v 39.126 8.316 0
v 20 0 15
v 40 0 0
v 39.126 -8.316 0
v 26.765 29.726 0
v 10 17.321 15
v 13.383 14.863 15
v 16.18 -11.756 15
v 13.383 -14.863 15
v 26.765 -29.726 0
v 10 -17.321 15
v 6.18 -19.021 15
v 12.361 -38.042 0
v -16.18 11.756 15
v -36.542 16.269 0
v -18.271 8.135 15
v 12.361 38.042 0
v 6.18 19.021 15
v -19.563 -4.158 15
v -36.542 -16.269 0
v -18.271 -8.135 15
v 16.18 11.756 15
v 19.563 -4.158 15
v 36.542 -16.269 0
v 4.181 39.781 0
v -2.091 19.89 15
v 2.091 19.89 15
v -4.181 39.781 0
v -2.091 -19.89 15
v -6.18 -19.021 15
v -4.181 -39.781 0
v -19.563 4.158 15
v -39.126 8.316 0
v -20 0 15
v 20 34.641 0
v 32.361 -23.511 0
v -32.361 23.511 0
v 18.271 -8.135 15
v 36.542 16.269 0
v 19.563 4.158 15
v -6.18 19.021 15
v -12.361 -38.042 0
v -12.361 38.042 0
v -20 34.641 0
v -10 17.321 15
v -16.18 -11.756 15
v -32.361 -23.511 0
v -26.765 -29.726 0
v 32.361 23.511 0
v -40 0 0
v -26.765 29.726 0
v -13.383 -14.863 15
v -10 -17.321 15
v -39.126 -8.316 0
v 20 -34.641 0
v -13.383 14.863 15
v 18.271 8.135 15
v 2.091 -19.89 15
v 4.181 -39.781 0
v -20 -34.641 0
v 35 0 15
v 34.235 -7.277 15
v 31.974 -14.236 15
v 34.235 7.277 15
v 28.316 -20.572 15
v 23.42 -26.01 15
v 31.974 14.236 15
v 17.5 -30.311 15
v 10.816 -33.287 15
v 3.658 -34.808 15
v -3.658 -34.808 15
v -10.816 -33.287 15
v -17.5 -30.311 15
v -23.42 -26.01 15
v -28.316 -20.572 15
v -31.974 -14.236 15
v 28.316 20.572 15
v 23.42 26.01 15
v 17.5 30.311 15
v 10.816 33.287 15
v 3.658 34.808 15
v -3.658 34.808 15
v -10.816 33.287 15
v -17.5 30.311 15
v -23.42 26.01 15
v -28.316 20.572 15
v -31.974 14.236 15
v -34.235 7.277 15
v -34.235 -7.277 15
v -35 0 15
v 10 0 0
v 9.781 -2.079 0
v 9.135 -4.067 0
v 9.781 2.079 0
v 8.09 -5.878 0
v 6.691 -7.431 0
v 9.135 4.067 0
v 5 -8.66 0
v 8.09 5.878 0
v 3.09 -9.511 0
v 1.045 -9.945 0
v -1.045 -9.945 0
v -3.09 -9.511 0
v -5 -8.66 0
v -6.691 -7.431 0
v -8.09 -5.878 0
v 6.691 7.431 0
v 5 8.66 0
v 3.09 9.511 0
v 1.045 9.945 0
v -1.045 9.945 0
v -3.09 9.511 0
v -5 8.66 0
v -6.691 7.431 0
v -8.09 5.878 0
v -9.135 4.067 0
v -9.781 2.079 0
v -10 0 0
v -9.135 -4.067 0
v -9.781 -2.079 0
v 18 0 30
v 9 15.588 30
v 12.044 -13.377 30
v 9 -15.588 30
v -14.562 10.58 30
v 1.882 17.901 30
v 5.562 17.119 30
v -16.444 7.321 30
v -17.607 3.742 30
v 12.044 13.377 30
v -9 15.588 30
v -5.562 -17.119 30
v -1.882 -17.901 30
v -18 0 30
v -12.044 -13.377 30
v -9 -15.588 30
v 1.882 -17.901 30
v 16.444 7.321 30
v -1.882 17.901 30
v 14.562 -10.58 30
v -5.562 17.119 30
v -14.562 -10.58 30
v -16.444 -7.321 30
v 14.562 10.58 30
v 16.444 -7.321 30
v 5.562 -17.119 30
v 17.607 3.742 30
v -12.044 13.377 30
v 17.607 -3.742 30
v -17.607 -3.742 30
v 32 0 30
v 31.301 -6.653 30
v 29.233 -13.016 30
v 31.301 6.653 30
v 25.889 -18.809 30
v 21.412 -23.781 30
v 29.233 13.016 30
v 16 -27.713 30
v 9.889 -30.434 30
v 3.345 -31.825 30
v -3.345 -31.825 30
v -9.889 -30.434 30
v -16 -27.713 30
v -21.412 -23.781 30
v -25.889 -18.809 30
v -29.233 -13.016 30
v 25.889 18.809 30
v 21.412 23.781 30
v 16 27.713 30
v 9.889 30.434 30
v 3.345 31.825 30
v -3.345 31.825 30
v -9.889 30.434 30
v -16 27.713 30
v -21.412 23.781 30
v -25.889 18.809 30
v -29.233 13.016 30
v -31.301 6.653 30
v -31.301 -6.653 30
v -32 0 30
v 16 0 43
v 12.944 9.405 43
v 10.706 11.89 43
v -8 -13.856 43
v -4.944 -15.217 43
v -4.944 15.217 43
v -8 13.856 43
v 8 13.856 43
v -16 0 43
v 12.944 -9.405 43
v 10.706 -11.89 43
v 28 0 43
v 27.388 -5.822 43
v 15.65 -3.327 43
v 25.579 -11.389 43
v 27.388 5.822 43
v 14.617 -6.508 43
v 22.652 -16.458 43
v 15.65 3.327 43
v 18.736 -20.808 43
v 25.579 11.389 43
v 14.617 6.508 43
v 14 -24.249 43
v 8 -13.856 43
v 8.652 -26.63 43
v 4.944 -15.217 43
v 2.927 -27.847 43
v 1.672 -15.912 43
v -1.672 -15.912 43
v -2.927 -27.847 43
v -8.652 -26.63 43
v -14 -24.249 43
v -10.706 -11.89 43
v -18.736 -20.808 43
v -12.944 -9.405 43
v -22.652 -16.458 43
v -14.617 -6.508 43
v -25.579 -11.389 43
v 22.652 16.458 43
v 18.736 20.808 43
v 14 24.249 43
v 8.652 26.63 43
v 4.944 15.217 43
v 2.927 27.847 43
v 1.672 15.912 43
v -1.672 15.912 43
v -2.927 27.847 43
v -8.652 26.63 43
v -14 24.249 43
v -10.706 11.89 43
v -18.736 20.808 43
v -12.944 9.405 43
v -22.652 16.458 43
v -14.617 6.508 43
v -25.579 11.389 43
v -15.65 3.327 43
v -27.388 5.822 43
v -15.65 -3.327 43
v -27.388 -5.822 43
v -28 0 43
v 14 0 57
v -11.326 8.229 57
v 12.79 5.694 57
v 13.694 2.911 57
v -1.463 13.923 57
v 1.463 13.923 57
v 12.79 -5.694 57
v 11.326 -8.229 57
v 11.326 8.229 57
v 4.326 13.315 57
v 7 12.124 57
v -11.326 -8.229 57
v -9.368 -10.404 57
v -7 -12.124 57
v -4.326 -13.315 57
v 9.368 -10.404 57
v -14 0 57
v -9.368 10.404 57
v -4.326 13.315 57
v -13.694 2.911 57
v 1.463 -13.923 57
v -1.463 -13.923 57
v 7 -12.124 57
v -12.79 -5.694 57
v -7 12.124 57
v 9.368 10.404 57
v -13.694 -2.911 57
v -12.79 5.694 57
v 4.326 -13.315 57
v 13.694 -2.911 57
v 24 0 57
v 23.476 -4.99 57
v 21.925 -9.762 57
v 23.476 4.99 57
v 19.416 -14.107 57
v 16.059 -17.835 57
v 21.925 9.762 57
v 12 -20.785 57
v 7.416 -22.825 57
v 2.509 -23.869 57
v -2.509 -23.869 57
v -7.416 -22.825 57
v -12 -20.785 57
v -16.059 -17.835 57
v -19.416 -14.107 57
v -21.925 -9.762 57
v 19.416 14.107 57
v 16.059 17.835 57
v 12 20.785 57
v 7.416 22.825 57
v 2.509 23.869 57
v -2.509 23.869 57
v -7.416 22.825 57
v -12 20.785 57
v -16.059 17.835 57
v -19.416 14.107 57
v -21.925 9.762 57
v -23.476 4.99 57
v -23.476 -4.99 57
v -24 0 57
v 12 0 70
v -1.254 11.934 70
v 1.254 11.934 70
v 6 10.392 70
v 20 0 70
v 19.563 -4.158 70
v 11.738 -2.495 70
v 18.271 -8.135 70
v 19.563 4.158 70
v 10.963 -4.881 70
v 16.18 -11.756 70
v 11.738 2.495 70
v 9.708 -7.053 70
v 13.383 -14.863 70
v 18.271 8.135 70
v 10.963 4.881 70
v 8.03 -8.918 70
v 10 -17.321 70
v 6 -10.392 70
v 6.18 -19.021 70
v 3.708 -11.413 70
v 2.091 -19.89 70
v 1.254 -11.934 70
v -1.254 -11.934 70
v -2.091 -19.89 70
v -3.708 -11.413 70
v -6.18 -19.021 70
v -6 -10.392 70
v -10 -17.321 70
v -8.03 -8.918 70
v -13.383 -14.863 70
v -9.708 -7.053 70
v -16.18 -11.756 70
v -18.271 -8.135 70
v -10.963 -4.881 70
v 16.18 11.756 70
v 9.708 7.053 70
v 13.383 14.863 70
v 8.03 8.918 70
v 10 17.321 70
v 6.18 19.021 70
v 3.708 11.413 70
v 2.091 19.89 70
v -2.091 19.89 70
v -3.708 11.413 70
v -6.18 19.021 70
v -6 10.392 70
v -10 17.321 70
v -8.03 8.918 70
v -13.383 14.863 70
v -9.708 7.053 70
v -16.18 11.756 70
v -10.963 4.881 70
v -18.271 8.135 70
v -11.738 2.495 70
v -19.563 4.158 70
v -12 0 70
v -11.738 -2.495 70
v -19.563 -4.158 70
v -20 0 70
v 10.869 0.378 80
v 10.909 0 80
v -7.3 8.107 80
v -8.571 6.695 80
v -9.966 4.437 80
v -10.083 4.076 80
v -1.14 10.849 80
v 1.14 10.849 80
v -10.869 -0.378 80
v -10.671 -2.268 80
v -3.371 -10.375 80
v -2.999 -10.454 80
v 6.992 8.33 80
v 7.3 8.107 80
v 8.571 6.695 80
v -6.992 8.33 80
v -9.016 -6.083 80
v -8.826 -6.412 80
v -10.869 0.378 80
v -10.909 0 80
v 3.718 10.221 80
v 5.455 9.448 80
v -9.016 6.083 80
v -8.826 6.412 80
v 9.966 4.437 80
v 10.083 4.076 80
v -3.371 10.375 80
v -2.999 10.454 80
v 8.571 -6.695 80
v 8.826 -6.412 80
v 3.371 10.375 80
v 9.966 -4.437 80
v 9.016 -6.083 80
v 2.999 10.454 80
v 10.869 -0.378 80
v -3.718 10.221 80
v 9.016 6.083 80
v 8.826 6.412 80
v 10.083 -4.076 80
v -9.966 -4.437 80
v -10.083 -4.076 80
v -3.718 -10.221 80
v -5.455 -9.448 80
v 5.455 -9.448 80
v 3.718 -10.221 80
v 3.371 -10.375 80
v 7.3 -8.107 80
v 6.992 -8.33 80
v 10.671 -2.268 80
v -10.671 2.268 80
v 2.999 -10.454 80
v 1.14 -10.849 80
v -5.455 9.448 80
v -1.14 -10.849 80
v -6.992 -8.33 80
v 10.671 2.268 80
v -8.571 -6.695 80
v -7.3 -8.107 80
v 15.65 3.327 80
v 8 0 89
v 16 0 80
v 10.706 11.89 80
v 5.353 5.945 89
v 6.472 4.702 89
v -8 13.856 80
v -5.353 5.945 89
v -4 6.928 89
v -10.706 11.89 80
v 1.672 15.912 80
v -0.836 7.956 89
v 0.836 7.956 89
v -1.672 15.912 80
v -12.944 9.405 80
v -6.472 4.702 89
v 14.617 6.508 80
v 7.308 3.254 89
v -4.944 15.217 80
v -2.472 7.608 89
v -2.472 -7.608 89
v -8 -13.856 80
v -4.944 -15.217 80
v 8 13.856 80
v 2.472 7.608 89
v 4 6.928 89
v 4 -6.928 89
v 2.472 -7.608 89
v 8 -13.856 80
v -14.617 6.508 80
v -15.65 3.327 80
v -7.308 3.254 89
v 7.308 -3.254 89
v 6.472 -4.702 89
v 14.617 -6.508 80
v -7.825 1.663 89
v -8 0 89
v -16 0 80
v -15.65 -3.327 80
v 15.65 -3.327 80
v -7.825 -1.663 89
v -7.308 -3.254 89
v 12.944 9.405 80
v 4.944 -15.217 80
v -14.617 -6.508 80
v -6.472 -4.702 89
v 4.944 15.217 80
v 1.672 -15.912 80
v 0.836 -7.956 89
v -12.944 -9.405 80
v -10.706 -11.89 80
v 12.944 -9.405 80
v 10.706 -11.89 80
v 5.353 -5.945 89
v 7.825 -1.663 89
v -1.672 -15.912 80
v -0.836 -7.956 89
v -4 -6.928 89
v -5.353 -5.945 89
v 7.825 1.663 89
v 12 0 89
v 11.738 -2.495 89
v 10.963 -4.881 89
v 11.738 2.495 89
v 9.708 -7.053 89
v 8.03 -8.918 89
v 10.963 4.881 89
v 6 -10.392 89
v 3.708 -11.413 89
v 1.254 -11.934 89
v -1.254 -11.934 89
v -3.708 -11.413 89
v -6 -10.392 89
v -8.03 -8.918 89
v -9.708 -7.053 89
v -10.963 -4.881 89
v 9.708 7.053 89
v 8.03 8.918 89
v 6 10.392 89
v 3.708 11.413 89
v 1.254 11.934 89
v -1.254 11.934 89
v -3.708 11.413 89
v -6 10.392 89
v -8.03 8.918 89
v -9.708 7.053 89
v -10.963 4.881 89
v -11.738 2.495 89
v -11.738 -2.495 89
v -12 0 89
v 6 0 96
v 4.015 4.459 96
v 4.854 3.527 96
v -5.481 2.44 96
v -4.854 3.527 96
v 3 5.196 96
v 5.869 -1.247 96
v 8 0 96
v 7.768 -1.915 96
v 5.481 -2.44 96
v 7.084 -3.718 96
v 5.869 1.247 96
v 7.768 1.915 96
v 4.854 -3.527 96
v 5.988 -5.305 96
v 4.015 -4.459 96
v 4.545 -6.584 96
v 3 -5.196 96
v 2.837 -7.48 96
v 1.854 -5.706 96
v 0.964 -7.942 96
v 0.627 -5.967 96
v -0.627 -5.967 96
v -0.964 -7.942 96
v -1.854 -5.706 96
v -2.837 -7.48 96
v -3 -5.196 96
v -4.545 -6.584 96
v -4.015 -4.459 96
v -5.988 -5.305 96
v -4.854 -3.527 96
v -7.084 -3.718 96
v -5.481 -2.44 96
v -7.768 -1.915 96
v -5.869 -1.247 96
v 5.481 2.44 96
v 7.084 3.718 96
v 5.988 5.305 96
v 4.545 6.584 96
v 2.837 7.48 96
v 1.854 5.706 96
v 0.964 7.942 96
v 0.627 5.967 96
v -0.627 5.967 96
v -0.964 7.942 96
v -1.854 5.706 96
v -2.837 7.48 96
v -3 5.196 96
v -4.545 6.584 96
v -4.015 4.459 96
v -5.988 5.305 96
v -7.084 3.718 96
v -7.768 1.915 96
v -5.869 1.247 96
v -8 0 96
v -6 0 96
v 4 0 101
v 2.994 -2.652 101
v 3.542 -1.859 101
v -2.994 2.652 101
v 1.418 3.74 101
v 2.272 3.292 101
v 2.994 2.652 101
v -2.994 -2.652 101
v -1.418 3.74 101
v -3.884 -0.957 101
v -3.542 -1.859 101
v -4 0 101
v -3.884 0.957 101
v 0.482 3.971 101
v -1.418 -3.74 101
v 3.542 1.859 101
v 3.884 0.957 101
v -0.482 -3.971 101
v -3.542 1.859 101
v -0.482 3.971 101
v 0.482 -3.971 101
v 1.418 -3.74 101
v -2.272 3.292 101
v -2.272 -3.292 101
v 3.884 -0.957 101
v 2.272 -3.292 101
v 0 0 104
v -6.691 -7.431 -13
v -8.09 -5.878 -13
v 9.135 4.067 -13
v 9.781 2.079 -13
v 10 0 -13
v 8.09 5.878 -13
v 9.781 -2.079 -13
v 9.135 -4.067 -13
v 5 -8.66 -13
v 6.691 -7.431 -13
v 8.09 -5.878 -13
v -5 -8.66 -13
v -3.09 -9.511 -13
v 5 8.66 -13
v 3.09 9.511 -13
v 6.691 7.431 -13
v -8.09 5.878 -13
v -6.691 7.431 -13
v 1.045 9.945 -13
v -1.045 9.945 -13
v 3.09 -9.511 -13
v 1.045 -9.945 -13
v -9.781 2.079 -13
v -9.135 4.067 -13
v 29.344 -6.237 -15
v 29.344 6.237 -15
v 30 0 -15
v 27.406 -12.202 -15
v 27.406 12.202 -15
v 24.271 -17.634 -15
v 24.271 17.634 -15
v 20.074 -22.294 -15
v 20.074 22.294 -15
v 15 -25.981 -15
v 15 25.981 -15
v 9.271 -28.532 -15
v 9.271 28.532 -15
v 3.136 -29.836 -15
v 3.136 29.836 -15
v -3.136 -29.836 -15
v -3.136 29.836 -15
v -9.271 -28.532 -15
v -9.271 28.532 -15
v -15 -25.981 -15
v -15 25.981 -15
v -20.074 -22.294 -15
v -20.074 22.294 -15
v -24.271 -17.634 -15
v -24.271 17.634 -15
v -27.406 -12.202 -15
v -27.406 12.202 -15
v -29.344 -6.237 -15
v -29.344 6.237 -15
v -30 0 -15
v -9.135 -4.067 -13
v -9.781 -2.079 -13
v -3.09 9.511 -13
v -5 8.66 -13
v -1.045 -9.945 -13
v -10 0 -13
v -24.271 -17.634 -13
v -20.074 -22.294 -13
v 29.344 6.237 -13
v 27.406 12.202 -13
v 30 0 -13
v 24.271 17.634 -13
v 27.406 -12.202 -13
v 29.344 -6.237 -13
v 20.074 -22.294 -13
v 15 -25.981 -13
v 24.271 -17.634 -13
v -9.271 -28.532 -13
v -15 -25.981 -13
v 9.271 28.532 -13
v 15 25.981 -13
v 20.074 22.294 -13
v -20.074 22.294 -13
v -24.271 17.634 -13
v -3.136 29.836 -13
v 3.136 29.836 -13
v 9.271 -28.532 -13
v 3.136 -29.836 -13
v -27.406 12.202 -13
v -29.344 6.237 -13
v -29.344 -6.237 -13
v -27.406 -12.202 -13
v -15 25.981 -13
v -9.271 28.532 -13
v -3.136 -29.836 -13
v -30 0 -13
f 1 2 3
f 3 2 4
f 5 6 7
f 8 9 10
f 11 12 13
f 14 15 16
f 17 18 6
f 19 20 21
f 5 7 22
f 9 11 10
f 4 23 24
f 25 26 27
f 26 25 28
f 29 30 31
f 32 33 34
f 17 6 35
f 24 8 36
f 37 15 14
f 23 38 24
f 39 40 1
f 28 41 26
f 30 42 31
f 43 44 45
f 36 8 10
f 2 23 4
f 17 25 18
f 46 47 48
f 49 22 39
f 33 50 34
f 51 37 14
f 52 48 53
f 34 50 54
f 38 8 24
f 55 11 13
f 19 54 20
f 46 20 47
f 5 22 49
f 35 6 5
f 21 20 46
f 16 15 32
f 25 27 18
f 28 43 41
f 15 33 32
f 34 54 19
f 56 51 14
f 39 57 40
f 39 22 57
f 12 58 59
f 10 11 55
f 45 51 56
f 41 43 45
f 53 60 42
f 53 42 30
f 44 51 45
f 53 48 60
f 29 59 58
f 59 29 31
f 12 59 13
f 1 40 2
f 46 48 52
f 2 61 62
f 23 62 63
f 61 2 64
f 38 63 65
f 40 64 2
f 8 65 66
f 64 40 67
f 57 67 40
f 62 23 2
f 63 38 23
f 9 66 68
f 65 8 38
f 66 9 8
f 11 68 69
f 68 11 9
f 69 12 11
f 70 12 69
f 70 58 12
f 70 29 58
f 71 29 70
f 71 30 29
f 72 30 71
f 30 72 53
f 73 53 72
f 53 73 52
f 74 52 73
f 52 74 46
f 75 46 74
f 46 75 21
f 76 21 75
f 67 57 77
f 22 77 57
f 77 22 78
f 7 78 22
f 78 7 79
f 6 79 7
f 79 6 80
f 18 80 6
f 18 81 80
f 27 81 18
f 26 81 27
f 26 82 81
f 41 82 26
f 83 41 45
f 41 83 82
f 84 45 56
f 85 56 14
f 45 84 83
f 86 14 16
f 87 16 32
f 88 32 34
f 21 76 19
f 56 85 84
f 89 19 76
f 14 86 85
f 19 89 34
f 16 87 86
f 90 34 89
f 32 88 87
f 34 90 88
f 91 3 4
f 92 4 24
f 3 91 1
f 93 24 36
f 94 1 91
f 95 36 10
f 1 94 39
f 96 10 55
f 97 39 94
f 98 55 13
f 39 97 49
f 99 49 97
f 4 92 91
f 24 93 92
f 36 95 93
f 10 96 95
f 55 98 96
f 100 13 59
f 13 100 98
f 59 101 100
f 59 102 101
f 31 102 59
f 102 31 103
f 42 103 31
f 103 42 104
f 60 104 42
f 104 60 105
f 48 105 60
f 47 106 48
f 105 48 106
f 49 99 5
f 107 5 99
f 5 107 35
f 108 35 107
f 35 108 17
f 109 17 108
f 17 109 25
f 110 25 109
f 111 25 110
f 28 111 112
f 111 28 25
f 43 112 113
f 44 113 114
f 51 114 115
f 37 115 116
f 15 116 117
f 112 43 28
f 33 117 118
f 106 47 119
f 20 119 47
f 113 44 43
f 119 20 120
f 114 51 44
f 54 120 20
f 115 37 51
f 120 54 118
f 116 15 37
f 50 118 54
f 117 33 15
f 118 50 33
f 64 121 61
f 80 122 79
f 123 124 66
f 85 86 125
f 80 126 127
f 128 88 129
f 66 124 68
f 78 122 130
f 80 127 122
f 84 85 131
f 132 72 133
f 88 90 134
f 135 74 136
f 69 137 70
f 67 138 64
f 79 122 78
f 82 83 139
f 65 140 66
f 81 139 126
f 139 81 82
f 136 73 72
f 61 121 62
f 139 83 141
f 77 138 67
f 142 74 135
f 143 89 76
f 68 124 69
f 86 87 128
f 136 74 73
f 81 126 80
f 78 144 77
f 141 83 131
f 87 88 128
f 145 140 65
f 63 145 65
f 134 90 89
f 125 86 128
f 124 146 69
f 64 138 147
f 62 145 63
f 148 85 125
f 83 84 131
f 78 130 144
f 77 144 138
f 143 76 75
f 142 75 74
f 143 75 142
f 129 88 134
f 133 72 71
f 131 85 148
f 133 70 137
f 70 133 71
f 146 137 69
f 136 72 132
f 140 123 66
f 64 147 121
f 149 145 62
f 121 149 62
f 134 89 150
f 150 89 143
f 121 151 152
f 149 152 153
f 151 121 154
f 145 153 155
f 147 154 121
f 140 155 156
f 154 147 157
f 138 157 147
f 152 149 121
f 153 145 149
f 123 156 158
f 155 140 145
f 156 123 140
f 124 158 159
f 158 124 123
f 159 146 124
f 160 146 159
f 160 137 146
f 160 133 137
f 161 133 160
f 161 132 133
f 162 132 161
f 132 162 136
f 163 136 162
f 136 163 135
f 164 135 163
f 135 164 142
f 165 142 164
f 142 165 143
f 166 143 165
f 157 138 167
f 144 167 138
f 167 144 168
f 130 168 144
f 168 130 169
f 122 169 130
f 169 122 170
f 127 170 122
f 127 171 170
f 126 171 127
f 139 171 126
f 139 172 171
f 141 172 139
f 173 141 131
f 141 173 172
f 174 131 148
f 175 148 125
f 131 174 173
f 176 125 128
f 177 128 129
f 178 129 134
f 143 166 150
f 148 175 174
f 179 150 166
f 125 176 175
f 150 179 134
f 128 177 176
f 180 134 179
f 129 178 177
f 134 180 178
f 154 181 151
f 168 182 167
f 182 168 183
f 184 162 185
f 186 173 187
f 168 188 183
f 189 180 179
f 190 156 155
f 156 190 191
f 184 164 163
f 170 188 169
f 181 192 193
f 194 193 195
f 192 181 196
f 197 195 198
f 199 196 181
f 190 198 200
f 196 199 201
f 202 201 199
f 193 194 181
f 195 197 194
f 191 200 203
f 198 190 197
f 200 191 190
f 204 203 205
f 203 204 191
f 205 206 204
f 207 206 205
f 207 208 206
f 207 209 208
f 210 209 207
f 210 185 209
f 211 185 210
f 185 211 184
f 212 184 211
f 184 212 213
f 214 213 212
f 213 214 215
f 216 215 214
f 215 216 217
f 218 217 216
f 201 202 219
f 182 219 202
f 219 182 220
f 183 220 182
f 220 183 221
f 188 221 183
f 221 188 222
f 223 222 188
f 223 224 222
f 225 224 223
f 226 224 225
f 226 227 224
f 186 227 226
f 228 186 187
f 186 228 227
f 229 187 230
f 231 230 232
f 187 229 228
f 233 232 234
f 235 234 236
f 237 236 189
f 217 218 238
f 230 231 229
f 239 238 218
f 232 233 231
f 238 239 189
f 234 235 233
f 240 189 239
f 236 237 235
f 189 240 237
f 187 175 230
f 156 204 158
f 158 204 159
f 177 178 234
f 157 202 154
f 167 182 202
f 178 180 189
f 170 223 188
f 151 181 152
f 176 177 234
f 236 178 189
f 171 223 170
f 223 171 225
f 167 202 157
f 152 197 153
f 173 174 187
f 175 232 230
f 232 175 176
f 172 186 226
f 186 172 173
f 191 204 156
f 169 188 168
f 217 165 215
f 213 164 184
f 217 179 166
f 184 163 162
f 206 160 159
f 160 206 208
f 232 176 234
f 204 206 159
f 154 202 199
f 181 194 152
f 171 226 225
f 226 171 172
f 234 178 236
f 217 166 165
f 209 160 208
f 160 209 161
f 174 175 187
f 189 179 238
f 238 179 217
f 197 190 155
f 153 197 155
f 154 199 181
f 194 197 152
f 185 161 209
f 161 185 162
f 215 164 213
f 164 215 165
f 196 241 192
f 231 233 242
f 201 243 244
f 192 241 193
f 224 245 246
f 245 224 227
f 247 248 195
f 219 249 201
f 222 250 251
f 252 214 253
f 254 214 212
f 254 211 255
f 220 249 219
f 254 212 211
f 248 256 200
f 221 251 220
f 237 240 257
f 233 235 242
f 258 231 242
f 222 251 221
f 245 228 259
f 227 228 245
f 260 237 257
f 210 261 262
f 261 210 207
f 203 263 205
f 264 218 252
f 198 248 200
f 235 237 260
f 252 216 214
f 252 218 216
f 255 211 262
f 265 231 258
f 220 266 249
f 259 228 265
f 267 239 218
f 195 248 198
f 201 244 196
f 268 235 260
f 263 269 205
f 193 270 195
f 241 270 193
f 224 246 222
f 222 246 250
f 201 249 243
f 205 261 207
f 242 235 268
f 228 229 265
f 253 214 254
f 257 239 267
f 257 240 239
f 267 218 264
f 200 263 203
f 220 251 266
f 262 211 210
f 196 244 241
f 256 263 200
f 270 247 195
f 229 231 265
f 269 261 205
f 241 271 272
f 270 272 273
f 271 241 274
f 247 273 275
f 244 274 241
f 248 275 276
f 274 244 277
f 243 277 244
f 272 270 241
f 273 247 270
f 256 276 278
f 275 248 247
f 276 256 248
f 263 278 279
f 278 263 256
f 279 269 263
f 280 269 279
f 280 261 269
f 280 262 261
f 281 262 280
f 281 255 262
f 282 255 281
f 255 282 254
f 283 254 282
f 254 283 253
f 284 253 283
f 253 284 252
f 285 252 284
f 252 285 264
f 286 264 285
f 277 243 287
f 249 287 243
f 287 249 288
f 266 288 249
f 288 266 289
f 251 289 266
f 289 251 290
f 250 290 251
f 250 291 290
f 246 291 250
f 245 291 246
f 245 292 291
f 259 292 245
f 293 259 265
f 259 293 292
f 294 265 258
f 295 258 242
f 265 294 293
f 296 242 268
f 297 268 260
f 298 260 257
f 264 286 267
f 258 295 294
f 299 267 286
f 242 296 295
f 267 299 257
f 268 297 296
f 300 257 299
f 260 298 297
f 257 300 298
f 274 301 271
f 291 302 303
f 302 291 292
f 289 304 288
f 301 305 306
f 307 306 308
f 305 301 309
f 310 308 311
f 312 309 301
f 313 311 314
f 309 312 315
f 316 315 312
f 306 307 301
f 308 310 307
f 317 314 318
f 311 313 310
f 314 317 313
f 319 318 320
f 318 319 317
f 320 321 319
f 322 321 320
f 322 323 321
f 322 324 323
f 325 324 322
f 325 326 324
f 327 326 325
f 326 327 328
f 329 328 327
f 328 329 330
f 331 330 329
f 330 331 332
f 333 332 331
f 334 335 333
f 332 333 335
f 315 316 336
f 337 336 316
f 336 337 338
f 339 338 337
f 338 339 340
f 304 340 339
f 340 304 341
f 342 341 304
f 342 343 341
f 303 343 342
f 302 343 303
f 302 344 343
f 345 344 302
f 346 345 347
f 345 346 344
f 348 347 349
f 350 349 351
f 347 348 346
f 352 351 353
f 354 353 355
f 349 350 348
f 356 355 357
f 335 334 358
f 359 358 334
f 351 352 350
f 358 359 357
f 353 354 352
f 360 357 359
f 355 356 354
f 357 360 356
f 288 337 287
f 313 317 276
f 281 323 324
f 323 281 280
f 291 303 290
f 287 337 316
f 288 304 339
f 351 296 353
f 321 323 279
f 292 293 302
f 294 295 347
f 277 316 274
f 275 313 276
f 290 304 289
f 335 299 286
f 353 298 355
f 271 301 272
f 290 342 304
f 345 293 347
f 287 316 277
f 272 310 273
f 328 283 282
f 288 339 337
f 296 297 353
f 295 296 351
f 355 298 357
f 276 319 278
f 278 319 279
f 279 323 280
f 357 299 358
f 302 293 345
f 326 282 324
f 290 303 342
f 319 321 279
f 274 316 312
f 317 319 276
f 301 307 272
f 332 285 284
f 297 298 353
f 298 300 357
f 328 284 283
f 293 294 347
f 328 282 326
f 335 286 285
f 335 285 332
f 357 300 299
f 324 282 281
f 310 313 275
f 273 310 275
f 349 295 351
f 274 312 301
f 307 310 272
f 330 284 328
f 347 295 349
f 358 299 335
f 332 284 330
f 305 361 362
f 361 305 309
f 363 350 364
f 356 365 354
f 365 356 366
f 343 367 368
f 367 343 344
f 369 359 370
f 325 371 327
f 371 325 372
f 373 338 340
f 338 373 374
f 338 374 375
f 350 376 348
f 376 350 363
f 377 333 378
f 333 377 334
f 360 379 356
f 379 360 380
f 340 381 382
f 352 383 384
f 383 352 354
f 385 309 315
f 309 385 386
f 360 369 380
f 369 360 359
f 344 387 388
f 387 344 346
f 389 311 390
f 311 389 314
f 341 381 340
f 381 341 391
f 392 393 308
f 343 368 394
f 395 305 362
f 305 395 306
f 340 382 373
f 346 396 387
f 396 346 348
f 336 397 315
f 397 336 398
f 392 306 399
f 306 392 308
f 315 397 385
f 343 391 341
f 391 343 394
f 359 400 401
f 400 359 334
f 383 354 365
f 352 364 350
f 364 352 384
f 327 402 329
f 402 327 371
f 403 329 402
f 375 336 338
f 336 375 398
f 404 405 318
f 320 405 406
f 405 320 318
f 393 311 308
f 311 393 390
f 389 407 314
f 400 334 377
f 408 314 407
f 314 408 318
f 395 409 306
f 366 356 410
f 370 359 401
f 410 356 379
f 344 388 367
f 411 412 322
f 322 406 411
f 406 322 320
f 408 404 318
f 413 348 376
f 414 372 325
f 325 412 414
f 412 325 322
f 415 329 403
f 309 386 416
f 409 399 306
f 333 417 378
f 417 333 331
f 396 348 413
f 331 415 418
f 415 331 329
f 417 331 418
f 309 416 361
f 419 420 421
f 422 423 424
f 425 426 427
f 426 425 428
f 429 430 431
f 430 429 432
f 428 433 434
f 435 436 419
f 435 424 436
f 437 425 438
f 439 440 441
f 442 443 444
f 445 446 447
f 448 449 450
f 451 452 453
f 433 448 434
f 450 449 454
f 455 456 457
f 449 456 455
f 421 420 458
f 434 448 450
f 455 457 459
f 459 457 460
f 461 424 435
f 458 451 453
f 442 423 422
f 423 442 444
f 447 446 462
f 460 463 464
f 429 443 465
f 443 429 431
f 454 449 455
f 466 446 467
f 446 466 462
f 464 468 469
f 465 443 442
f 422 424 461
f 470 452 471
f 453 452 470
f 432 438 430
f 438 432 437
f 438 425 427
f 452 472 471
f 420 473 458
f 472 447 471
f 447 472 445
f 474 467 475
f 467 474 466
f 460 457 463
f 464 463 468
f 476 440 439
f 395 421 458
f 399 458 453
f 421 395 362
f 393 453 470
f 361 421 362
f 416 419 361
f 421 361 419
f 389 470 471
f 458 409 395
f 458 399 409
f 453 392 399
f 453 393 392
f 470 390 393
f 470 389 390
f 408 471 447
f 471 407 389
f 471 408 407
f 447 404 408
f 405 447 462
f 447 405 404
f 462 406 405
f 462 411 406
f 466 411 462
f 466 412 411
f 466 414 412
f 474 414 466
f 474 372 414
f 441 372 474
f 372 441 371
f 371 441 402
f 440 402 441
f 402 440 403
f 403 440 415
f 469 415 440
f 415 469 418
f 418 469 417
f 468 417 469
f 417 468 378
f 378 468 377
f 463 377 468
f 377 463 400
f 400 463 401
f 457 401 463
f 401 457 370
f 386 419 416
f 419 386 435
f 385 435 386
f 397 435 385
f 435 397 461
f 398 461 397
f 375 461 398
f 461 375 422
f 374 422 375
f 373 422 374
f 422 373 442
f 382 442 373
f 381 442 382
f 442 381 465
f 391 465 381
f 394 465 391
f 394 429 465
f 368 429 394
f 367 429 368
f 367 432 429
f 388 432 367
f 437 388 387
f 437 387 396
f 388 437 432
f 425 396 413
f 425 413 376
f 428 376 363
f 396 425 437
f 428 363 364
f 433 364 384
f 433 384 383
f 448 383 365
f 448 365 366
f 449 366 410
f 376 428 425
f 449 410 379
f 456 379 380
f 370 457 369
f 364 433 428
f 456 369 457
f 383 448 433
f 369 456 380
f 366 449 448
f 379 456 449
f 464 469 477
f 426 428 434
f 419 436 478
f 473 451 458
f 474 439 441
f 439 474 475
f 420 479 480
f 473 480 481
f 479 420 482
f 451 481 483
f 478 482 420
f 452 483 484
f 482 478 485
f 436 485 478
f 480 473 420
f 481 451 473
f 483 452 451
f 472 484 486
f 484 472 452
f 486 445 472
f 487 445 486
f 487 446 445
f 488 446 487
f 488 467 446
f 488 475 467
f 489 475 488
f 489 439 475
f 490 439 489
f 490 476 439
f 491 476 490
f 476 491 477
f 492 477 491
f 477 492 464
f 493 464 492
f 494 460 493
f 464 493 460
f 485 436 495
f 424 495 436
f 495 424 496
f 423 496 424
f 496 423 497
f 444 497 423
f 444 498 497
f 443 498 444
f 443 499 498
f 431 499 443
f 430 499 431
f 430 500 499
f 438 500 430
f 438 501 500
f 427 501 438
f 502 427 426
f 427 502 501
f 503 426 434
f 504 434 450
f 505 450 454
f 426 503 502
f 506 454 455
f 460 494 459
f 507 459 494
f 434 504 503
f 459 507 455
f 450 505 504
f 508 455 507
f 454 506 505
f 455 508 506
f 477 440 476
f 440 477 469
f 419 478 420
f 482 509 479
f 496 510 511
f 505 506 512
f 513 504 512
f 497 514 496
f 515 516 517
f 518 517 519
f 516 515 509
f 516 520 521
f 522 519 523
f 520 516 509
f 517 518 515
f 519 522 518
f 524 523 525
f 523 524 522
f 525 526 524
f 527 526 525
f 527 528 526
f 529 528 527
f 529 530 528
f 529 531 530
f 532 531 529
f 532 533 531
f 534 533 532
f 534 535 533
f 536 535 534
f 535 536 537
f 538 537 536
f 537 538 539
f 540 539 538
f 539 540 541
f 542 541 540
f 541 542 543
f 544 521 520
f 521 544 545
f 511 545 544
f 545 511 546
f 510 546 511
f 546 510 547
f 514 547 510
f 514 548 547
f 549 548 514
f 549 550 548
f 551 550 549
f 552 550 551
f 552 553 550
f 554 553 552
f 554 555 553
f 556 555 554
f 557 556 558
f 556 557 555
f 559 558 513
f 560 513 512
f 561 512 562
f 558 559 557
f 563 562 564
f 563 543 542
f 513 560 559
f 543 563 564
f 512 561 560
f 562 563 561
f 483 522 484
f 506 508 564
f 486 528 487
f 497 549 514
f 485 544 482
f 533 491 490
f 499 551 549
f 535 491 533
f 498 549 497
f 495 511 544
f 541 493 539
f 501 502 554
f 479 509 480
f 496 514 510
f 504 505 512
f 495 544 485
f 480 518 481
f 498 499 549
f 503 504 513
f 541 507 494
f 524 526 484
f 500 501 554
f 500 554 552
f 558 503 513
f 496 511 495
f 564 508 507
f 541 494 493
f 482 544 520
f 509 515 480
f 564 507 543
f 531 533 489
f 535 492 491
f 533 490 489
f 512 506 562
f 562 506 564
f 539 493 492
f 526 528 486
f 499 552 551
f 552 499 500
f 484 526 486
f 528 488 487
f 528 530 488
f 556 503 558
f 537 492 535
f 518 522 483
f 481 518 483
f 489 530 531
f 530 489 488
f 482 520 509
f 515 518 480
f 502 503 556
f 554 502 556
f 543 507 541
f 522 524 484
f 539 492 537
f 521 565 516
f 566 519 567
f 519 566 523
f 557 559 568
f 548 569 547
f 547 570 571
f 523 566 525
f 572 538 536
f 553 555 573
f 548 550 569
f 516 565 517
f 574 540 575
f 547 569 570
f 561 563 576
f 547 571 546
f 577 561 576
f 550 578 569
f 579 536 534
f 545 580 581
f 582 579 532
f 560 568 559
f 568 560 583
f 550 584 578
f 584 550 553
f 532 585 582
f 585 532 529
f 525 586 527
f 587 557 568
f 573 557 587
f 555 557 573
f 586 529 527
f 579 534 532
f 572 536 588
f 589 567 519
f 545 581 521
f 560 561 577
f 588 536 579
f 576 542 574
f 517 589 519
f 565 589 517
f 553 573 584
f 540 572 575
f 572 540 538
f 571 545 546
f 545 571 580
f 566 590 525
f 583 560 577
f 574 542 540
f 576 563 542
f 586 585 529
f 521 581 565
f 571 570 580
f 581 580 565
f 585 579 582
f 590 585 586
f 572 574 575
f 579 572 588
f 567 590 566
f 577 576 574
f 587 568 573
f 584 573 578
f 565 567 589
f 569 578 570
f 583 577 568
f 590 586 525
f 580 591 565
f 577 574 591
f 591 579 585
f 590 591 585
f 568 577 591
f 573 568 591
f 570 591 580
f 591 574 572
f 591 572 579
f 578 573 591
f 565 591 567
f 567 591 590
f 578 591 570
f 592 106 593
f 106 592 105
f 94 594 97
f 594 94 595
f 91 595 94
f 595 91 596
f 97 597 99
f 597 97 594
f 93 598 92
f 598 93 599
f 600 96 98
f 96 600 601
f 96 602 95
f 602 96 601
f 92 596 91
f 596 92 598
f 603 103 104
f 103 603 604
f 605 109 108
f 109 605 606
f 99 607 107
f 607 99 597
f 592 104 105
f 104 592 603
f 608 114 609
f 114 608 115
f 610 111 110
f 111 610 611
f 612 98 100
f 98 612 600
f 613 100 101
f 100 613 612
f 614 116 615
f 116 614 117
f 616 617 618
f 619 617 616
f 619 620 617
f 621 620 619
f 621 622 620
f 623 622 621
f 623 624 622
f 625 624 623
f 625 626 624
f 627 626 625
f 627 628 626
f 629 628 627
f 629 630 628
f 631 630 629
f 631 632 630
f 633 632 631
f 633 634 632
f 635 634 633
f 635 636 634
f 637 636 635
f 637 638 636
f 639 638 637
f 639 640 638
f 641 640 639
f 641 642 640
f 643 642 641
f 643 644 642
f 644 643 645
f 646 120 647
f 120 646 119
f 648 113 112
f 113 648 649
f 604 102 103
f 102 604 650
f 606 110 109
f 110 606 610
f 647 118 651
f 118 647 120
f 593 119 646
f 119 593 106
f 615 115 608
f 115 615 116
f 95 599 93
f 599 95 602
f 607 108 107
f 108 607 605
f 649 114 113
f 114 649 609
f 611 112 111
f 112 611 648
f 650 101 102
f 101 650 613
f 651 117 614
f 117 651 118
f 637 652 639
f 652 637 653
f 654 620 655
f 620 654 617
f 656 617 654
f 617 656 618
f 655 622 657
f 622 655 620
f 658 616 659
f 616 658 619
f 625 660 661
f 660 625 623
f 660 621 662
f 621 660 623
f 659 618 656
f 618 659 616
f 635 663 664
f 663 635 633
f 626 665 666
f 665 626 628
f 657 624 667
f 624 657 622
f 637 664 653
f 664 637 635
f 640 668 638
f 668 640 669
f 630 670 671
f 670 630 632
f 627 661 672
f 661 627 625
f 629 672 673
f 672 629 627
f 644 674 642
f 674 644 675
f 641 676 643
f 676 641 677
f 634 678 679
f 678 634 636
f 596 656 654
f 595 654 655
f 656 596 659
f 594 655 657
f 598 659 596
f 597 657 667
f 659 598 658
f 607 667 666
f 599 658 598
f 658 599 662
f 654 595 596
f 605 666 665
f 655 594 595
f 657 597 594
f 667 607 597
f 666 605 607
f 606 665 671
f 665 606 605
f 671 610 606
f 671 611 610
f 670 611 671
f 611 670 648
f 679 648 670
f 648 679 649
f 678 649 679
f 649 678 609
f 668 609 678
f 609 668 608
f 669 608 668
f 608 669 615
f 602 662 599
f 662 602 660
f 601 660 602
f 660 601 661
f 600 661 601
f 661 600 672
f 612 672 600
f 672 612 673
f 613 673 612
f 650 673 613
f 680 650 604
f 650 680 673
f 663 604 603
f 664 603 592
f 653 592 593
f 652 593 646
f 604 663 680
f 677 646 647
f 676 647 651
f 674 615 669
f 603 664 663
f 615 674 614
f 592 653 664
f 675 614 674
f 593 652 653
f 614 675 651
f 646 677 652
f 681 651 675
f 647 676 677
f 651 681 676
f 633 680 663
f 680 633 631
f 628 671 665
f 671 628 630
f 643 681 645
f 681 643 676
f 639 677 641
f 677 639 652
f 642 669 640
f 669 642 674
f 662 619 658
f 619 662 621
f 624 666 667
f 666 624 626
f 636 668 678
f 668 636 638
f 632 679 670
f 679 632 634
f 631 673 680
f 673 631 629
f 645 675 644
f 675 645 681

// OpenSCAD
h=15;  //высота уровня
f=15; //расстояние между уровнями
r1=40; //радиус основания
r2=20; //радиус вершины
q1=4; //разница радиуса основания
q2=2; //разница радиуса вершины

	cylinder(h,40,20); //1 уровень
	translate([0,0,f]) cylinder(h,r1-5,r2-2);
	translate([0,0,f+h]) cylinder(h-2,r1-2*q1,r2-2*q2);
	translate([0,0,f+2*h-2]) cylinder(h-1,r1-3*q1,r2-3*q2);
	translate([0,0,f+3*h-3]) cylinder(h-2,r1-4*q1,r2-4*q2);
	translate([0,0,f+4*h-5]) cylinder(h-4,r1-5*q1,r2-5*q2);
	translate([0,0,f+5*h-10]) cylinder(h-6,r1-6*q1,r2-6*q2);
	translate([0,0,f+5*h-1]) cylinder(h-8,r1-7*q1,r2-7*q2);
	translate([0,0,f+5*h+6]) cylinder(h-10,r1-8*q1,r2-8*q2);
	translate([0,0,f+5*h+11]) cylinder(h-12,r1-9*q1,0);

//нога
	translate([0,0,-15]) cylinder(15,10,10);
	translate([0,0,-15]) cylinder(2,30,30);
